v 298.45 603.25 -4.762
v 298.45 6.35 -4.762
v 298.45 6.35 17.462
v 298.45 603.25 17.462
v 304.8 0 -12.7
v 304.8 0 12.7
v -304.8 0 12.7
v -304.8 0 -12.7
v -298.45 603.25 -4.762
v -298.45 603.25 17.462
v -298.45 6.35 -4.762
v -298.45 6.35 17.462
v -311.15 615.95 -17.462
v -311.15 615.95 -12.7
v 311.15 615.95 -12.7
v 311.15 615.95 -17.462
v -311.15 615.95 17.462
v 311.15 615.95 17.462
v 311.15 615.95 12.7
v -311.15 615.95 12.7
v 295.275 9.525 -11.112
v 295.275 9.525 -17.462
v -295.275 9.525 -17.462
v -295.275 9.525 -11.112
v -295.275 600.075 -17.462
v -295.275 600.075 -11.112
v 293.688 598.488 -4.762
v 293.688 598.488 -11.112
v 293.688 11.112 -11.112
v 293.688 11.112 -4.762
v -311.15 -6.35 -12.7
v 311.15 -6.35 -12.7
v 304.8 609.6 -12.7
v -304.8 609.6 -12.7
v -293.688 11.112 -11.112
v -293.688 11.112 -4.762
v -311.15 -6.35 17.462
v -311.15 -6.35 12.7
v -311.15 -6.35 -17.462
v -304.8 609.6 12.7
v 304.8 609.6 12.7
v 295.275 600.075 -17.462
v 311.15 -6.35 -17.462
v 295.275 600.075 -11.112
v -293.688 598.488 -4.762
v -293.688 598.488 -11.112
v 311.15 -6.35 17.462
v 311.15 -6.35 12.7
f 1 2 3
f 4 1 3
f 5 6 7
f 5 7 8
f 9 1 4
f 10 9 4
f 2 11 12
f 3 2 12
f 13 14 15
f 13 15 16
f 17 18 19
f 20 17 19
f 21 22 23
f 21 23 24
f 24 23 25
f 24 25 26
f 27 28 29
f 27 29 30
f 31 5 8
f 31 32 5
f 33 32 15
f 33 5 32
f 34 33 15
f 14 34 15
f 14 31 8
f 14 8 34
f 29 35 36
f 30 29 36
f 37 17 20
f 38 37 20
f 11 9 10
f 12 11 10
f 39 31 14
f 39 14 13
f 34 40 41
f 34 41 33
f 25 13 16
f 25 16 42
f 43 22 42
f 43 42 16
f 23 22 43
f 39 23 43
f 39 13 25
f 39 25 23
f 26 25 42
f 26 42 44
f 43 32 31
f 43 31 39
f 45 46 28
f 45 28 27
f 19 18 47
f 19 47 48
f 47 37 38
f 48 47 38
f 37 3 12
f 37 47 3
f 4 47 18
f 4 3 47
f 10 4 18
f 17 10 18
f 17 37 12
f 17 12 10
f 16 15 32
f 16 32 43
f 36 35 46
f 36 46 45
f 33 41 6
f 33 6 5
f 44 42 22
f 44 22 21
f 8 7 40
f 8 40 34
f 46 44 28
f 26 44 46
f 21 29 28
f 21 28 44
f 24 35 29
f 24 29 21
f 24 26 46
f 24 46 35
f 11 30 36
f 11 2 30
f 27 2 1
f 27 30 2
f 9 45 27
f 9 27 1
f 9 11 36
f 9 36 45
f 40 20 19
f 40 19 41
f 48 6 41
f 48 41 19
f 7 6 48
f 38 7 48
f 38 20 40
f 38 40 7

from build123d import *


with BuildPart() as part:
    # Sweep1: sweep along a path in Sketch2
    with BuildLine(Plane.XY) as sweep1_path:
        Line((304.8, 609.6), (-304.8, 609.6))
        Line((-304.8, 609.6), (-304.8, 0))
        Line((-304.8, 0), (304.8, 0))
        Line((304.8, 0), (304.8, 609.6))
    # Sketch1 → Sweep1 (sweep)
    with BuildSketch(Plane(origin=(0, 0, 0), x_dir=(0, 0, -1), z_dir=(1, 0, 0))):
        Polygon((-12.7, -6.35), (-17.4625, -6.35), (-17.4625, 6.35), (4.7625, 6.35), (4.7625, 11.1125), (11.1125, 11.1125), (11.1125, 9.525), (17.4625, 9.525), (17.4625, -6.35), (12.7, -6.35), (12.7, 0), (-12.7, 0), align=None)
    sweep(path=sweep1_path.line, transition=Transition.RIGHT)


solid = part.part
